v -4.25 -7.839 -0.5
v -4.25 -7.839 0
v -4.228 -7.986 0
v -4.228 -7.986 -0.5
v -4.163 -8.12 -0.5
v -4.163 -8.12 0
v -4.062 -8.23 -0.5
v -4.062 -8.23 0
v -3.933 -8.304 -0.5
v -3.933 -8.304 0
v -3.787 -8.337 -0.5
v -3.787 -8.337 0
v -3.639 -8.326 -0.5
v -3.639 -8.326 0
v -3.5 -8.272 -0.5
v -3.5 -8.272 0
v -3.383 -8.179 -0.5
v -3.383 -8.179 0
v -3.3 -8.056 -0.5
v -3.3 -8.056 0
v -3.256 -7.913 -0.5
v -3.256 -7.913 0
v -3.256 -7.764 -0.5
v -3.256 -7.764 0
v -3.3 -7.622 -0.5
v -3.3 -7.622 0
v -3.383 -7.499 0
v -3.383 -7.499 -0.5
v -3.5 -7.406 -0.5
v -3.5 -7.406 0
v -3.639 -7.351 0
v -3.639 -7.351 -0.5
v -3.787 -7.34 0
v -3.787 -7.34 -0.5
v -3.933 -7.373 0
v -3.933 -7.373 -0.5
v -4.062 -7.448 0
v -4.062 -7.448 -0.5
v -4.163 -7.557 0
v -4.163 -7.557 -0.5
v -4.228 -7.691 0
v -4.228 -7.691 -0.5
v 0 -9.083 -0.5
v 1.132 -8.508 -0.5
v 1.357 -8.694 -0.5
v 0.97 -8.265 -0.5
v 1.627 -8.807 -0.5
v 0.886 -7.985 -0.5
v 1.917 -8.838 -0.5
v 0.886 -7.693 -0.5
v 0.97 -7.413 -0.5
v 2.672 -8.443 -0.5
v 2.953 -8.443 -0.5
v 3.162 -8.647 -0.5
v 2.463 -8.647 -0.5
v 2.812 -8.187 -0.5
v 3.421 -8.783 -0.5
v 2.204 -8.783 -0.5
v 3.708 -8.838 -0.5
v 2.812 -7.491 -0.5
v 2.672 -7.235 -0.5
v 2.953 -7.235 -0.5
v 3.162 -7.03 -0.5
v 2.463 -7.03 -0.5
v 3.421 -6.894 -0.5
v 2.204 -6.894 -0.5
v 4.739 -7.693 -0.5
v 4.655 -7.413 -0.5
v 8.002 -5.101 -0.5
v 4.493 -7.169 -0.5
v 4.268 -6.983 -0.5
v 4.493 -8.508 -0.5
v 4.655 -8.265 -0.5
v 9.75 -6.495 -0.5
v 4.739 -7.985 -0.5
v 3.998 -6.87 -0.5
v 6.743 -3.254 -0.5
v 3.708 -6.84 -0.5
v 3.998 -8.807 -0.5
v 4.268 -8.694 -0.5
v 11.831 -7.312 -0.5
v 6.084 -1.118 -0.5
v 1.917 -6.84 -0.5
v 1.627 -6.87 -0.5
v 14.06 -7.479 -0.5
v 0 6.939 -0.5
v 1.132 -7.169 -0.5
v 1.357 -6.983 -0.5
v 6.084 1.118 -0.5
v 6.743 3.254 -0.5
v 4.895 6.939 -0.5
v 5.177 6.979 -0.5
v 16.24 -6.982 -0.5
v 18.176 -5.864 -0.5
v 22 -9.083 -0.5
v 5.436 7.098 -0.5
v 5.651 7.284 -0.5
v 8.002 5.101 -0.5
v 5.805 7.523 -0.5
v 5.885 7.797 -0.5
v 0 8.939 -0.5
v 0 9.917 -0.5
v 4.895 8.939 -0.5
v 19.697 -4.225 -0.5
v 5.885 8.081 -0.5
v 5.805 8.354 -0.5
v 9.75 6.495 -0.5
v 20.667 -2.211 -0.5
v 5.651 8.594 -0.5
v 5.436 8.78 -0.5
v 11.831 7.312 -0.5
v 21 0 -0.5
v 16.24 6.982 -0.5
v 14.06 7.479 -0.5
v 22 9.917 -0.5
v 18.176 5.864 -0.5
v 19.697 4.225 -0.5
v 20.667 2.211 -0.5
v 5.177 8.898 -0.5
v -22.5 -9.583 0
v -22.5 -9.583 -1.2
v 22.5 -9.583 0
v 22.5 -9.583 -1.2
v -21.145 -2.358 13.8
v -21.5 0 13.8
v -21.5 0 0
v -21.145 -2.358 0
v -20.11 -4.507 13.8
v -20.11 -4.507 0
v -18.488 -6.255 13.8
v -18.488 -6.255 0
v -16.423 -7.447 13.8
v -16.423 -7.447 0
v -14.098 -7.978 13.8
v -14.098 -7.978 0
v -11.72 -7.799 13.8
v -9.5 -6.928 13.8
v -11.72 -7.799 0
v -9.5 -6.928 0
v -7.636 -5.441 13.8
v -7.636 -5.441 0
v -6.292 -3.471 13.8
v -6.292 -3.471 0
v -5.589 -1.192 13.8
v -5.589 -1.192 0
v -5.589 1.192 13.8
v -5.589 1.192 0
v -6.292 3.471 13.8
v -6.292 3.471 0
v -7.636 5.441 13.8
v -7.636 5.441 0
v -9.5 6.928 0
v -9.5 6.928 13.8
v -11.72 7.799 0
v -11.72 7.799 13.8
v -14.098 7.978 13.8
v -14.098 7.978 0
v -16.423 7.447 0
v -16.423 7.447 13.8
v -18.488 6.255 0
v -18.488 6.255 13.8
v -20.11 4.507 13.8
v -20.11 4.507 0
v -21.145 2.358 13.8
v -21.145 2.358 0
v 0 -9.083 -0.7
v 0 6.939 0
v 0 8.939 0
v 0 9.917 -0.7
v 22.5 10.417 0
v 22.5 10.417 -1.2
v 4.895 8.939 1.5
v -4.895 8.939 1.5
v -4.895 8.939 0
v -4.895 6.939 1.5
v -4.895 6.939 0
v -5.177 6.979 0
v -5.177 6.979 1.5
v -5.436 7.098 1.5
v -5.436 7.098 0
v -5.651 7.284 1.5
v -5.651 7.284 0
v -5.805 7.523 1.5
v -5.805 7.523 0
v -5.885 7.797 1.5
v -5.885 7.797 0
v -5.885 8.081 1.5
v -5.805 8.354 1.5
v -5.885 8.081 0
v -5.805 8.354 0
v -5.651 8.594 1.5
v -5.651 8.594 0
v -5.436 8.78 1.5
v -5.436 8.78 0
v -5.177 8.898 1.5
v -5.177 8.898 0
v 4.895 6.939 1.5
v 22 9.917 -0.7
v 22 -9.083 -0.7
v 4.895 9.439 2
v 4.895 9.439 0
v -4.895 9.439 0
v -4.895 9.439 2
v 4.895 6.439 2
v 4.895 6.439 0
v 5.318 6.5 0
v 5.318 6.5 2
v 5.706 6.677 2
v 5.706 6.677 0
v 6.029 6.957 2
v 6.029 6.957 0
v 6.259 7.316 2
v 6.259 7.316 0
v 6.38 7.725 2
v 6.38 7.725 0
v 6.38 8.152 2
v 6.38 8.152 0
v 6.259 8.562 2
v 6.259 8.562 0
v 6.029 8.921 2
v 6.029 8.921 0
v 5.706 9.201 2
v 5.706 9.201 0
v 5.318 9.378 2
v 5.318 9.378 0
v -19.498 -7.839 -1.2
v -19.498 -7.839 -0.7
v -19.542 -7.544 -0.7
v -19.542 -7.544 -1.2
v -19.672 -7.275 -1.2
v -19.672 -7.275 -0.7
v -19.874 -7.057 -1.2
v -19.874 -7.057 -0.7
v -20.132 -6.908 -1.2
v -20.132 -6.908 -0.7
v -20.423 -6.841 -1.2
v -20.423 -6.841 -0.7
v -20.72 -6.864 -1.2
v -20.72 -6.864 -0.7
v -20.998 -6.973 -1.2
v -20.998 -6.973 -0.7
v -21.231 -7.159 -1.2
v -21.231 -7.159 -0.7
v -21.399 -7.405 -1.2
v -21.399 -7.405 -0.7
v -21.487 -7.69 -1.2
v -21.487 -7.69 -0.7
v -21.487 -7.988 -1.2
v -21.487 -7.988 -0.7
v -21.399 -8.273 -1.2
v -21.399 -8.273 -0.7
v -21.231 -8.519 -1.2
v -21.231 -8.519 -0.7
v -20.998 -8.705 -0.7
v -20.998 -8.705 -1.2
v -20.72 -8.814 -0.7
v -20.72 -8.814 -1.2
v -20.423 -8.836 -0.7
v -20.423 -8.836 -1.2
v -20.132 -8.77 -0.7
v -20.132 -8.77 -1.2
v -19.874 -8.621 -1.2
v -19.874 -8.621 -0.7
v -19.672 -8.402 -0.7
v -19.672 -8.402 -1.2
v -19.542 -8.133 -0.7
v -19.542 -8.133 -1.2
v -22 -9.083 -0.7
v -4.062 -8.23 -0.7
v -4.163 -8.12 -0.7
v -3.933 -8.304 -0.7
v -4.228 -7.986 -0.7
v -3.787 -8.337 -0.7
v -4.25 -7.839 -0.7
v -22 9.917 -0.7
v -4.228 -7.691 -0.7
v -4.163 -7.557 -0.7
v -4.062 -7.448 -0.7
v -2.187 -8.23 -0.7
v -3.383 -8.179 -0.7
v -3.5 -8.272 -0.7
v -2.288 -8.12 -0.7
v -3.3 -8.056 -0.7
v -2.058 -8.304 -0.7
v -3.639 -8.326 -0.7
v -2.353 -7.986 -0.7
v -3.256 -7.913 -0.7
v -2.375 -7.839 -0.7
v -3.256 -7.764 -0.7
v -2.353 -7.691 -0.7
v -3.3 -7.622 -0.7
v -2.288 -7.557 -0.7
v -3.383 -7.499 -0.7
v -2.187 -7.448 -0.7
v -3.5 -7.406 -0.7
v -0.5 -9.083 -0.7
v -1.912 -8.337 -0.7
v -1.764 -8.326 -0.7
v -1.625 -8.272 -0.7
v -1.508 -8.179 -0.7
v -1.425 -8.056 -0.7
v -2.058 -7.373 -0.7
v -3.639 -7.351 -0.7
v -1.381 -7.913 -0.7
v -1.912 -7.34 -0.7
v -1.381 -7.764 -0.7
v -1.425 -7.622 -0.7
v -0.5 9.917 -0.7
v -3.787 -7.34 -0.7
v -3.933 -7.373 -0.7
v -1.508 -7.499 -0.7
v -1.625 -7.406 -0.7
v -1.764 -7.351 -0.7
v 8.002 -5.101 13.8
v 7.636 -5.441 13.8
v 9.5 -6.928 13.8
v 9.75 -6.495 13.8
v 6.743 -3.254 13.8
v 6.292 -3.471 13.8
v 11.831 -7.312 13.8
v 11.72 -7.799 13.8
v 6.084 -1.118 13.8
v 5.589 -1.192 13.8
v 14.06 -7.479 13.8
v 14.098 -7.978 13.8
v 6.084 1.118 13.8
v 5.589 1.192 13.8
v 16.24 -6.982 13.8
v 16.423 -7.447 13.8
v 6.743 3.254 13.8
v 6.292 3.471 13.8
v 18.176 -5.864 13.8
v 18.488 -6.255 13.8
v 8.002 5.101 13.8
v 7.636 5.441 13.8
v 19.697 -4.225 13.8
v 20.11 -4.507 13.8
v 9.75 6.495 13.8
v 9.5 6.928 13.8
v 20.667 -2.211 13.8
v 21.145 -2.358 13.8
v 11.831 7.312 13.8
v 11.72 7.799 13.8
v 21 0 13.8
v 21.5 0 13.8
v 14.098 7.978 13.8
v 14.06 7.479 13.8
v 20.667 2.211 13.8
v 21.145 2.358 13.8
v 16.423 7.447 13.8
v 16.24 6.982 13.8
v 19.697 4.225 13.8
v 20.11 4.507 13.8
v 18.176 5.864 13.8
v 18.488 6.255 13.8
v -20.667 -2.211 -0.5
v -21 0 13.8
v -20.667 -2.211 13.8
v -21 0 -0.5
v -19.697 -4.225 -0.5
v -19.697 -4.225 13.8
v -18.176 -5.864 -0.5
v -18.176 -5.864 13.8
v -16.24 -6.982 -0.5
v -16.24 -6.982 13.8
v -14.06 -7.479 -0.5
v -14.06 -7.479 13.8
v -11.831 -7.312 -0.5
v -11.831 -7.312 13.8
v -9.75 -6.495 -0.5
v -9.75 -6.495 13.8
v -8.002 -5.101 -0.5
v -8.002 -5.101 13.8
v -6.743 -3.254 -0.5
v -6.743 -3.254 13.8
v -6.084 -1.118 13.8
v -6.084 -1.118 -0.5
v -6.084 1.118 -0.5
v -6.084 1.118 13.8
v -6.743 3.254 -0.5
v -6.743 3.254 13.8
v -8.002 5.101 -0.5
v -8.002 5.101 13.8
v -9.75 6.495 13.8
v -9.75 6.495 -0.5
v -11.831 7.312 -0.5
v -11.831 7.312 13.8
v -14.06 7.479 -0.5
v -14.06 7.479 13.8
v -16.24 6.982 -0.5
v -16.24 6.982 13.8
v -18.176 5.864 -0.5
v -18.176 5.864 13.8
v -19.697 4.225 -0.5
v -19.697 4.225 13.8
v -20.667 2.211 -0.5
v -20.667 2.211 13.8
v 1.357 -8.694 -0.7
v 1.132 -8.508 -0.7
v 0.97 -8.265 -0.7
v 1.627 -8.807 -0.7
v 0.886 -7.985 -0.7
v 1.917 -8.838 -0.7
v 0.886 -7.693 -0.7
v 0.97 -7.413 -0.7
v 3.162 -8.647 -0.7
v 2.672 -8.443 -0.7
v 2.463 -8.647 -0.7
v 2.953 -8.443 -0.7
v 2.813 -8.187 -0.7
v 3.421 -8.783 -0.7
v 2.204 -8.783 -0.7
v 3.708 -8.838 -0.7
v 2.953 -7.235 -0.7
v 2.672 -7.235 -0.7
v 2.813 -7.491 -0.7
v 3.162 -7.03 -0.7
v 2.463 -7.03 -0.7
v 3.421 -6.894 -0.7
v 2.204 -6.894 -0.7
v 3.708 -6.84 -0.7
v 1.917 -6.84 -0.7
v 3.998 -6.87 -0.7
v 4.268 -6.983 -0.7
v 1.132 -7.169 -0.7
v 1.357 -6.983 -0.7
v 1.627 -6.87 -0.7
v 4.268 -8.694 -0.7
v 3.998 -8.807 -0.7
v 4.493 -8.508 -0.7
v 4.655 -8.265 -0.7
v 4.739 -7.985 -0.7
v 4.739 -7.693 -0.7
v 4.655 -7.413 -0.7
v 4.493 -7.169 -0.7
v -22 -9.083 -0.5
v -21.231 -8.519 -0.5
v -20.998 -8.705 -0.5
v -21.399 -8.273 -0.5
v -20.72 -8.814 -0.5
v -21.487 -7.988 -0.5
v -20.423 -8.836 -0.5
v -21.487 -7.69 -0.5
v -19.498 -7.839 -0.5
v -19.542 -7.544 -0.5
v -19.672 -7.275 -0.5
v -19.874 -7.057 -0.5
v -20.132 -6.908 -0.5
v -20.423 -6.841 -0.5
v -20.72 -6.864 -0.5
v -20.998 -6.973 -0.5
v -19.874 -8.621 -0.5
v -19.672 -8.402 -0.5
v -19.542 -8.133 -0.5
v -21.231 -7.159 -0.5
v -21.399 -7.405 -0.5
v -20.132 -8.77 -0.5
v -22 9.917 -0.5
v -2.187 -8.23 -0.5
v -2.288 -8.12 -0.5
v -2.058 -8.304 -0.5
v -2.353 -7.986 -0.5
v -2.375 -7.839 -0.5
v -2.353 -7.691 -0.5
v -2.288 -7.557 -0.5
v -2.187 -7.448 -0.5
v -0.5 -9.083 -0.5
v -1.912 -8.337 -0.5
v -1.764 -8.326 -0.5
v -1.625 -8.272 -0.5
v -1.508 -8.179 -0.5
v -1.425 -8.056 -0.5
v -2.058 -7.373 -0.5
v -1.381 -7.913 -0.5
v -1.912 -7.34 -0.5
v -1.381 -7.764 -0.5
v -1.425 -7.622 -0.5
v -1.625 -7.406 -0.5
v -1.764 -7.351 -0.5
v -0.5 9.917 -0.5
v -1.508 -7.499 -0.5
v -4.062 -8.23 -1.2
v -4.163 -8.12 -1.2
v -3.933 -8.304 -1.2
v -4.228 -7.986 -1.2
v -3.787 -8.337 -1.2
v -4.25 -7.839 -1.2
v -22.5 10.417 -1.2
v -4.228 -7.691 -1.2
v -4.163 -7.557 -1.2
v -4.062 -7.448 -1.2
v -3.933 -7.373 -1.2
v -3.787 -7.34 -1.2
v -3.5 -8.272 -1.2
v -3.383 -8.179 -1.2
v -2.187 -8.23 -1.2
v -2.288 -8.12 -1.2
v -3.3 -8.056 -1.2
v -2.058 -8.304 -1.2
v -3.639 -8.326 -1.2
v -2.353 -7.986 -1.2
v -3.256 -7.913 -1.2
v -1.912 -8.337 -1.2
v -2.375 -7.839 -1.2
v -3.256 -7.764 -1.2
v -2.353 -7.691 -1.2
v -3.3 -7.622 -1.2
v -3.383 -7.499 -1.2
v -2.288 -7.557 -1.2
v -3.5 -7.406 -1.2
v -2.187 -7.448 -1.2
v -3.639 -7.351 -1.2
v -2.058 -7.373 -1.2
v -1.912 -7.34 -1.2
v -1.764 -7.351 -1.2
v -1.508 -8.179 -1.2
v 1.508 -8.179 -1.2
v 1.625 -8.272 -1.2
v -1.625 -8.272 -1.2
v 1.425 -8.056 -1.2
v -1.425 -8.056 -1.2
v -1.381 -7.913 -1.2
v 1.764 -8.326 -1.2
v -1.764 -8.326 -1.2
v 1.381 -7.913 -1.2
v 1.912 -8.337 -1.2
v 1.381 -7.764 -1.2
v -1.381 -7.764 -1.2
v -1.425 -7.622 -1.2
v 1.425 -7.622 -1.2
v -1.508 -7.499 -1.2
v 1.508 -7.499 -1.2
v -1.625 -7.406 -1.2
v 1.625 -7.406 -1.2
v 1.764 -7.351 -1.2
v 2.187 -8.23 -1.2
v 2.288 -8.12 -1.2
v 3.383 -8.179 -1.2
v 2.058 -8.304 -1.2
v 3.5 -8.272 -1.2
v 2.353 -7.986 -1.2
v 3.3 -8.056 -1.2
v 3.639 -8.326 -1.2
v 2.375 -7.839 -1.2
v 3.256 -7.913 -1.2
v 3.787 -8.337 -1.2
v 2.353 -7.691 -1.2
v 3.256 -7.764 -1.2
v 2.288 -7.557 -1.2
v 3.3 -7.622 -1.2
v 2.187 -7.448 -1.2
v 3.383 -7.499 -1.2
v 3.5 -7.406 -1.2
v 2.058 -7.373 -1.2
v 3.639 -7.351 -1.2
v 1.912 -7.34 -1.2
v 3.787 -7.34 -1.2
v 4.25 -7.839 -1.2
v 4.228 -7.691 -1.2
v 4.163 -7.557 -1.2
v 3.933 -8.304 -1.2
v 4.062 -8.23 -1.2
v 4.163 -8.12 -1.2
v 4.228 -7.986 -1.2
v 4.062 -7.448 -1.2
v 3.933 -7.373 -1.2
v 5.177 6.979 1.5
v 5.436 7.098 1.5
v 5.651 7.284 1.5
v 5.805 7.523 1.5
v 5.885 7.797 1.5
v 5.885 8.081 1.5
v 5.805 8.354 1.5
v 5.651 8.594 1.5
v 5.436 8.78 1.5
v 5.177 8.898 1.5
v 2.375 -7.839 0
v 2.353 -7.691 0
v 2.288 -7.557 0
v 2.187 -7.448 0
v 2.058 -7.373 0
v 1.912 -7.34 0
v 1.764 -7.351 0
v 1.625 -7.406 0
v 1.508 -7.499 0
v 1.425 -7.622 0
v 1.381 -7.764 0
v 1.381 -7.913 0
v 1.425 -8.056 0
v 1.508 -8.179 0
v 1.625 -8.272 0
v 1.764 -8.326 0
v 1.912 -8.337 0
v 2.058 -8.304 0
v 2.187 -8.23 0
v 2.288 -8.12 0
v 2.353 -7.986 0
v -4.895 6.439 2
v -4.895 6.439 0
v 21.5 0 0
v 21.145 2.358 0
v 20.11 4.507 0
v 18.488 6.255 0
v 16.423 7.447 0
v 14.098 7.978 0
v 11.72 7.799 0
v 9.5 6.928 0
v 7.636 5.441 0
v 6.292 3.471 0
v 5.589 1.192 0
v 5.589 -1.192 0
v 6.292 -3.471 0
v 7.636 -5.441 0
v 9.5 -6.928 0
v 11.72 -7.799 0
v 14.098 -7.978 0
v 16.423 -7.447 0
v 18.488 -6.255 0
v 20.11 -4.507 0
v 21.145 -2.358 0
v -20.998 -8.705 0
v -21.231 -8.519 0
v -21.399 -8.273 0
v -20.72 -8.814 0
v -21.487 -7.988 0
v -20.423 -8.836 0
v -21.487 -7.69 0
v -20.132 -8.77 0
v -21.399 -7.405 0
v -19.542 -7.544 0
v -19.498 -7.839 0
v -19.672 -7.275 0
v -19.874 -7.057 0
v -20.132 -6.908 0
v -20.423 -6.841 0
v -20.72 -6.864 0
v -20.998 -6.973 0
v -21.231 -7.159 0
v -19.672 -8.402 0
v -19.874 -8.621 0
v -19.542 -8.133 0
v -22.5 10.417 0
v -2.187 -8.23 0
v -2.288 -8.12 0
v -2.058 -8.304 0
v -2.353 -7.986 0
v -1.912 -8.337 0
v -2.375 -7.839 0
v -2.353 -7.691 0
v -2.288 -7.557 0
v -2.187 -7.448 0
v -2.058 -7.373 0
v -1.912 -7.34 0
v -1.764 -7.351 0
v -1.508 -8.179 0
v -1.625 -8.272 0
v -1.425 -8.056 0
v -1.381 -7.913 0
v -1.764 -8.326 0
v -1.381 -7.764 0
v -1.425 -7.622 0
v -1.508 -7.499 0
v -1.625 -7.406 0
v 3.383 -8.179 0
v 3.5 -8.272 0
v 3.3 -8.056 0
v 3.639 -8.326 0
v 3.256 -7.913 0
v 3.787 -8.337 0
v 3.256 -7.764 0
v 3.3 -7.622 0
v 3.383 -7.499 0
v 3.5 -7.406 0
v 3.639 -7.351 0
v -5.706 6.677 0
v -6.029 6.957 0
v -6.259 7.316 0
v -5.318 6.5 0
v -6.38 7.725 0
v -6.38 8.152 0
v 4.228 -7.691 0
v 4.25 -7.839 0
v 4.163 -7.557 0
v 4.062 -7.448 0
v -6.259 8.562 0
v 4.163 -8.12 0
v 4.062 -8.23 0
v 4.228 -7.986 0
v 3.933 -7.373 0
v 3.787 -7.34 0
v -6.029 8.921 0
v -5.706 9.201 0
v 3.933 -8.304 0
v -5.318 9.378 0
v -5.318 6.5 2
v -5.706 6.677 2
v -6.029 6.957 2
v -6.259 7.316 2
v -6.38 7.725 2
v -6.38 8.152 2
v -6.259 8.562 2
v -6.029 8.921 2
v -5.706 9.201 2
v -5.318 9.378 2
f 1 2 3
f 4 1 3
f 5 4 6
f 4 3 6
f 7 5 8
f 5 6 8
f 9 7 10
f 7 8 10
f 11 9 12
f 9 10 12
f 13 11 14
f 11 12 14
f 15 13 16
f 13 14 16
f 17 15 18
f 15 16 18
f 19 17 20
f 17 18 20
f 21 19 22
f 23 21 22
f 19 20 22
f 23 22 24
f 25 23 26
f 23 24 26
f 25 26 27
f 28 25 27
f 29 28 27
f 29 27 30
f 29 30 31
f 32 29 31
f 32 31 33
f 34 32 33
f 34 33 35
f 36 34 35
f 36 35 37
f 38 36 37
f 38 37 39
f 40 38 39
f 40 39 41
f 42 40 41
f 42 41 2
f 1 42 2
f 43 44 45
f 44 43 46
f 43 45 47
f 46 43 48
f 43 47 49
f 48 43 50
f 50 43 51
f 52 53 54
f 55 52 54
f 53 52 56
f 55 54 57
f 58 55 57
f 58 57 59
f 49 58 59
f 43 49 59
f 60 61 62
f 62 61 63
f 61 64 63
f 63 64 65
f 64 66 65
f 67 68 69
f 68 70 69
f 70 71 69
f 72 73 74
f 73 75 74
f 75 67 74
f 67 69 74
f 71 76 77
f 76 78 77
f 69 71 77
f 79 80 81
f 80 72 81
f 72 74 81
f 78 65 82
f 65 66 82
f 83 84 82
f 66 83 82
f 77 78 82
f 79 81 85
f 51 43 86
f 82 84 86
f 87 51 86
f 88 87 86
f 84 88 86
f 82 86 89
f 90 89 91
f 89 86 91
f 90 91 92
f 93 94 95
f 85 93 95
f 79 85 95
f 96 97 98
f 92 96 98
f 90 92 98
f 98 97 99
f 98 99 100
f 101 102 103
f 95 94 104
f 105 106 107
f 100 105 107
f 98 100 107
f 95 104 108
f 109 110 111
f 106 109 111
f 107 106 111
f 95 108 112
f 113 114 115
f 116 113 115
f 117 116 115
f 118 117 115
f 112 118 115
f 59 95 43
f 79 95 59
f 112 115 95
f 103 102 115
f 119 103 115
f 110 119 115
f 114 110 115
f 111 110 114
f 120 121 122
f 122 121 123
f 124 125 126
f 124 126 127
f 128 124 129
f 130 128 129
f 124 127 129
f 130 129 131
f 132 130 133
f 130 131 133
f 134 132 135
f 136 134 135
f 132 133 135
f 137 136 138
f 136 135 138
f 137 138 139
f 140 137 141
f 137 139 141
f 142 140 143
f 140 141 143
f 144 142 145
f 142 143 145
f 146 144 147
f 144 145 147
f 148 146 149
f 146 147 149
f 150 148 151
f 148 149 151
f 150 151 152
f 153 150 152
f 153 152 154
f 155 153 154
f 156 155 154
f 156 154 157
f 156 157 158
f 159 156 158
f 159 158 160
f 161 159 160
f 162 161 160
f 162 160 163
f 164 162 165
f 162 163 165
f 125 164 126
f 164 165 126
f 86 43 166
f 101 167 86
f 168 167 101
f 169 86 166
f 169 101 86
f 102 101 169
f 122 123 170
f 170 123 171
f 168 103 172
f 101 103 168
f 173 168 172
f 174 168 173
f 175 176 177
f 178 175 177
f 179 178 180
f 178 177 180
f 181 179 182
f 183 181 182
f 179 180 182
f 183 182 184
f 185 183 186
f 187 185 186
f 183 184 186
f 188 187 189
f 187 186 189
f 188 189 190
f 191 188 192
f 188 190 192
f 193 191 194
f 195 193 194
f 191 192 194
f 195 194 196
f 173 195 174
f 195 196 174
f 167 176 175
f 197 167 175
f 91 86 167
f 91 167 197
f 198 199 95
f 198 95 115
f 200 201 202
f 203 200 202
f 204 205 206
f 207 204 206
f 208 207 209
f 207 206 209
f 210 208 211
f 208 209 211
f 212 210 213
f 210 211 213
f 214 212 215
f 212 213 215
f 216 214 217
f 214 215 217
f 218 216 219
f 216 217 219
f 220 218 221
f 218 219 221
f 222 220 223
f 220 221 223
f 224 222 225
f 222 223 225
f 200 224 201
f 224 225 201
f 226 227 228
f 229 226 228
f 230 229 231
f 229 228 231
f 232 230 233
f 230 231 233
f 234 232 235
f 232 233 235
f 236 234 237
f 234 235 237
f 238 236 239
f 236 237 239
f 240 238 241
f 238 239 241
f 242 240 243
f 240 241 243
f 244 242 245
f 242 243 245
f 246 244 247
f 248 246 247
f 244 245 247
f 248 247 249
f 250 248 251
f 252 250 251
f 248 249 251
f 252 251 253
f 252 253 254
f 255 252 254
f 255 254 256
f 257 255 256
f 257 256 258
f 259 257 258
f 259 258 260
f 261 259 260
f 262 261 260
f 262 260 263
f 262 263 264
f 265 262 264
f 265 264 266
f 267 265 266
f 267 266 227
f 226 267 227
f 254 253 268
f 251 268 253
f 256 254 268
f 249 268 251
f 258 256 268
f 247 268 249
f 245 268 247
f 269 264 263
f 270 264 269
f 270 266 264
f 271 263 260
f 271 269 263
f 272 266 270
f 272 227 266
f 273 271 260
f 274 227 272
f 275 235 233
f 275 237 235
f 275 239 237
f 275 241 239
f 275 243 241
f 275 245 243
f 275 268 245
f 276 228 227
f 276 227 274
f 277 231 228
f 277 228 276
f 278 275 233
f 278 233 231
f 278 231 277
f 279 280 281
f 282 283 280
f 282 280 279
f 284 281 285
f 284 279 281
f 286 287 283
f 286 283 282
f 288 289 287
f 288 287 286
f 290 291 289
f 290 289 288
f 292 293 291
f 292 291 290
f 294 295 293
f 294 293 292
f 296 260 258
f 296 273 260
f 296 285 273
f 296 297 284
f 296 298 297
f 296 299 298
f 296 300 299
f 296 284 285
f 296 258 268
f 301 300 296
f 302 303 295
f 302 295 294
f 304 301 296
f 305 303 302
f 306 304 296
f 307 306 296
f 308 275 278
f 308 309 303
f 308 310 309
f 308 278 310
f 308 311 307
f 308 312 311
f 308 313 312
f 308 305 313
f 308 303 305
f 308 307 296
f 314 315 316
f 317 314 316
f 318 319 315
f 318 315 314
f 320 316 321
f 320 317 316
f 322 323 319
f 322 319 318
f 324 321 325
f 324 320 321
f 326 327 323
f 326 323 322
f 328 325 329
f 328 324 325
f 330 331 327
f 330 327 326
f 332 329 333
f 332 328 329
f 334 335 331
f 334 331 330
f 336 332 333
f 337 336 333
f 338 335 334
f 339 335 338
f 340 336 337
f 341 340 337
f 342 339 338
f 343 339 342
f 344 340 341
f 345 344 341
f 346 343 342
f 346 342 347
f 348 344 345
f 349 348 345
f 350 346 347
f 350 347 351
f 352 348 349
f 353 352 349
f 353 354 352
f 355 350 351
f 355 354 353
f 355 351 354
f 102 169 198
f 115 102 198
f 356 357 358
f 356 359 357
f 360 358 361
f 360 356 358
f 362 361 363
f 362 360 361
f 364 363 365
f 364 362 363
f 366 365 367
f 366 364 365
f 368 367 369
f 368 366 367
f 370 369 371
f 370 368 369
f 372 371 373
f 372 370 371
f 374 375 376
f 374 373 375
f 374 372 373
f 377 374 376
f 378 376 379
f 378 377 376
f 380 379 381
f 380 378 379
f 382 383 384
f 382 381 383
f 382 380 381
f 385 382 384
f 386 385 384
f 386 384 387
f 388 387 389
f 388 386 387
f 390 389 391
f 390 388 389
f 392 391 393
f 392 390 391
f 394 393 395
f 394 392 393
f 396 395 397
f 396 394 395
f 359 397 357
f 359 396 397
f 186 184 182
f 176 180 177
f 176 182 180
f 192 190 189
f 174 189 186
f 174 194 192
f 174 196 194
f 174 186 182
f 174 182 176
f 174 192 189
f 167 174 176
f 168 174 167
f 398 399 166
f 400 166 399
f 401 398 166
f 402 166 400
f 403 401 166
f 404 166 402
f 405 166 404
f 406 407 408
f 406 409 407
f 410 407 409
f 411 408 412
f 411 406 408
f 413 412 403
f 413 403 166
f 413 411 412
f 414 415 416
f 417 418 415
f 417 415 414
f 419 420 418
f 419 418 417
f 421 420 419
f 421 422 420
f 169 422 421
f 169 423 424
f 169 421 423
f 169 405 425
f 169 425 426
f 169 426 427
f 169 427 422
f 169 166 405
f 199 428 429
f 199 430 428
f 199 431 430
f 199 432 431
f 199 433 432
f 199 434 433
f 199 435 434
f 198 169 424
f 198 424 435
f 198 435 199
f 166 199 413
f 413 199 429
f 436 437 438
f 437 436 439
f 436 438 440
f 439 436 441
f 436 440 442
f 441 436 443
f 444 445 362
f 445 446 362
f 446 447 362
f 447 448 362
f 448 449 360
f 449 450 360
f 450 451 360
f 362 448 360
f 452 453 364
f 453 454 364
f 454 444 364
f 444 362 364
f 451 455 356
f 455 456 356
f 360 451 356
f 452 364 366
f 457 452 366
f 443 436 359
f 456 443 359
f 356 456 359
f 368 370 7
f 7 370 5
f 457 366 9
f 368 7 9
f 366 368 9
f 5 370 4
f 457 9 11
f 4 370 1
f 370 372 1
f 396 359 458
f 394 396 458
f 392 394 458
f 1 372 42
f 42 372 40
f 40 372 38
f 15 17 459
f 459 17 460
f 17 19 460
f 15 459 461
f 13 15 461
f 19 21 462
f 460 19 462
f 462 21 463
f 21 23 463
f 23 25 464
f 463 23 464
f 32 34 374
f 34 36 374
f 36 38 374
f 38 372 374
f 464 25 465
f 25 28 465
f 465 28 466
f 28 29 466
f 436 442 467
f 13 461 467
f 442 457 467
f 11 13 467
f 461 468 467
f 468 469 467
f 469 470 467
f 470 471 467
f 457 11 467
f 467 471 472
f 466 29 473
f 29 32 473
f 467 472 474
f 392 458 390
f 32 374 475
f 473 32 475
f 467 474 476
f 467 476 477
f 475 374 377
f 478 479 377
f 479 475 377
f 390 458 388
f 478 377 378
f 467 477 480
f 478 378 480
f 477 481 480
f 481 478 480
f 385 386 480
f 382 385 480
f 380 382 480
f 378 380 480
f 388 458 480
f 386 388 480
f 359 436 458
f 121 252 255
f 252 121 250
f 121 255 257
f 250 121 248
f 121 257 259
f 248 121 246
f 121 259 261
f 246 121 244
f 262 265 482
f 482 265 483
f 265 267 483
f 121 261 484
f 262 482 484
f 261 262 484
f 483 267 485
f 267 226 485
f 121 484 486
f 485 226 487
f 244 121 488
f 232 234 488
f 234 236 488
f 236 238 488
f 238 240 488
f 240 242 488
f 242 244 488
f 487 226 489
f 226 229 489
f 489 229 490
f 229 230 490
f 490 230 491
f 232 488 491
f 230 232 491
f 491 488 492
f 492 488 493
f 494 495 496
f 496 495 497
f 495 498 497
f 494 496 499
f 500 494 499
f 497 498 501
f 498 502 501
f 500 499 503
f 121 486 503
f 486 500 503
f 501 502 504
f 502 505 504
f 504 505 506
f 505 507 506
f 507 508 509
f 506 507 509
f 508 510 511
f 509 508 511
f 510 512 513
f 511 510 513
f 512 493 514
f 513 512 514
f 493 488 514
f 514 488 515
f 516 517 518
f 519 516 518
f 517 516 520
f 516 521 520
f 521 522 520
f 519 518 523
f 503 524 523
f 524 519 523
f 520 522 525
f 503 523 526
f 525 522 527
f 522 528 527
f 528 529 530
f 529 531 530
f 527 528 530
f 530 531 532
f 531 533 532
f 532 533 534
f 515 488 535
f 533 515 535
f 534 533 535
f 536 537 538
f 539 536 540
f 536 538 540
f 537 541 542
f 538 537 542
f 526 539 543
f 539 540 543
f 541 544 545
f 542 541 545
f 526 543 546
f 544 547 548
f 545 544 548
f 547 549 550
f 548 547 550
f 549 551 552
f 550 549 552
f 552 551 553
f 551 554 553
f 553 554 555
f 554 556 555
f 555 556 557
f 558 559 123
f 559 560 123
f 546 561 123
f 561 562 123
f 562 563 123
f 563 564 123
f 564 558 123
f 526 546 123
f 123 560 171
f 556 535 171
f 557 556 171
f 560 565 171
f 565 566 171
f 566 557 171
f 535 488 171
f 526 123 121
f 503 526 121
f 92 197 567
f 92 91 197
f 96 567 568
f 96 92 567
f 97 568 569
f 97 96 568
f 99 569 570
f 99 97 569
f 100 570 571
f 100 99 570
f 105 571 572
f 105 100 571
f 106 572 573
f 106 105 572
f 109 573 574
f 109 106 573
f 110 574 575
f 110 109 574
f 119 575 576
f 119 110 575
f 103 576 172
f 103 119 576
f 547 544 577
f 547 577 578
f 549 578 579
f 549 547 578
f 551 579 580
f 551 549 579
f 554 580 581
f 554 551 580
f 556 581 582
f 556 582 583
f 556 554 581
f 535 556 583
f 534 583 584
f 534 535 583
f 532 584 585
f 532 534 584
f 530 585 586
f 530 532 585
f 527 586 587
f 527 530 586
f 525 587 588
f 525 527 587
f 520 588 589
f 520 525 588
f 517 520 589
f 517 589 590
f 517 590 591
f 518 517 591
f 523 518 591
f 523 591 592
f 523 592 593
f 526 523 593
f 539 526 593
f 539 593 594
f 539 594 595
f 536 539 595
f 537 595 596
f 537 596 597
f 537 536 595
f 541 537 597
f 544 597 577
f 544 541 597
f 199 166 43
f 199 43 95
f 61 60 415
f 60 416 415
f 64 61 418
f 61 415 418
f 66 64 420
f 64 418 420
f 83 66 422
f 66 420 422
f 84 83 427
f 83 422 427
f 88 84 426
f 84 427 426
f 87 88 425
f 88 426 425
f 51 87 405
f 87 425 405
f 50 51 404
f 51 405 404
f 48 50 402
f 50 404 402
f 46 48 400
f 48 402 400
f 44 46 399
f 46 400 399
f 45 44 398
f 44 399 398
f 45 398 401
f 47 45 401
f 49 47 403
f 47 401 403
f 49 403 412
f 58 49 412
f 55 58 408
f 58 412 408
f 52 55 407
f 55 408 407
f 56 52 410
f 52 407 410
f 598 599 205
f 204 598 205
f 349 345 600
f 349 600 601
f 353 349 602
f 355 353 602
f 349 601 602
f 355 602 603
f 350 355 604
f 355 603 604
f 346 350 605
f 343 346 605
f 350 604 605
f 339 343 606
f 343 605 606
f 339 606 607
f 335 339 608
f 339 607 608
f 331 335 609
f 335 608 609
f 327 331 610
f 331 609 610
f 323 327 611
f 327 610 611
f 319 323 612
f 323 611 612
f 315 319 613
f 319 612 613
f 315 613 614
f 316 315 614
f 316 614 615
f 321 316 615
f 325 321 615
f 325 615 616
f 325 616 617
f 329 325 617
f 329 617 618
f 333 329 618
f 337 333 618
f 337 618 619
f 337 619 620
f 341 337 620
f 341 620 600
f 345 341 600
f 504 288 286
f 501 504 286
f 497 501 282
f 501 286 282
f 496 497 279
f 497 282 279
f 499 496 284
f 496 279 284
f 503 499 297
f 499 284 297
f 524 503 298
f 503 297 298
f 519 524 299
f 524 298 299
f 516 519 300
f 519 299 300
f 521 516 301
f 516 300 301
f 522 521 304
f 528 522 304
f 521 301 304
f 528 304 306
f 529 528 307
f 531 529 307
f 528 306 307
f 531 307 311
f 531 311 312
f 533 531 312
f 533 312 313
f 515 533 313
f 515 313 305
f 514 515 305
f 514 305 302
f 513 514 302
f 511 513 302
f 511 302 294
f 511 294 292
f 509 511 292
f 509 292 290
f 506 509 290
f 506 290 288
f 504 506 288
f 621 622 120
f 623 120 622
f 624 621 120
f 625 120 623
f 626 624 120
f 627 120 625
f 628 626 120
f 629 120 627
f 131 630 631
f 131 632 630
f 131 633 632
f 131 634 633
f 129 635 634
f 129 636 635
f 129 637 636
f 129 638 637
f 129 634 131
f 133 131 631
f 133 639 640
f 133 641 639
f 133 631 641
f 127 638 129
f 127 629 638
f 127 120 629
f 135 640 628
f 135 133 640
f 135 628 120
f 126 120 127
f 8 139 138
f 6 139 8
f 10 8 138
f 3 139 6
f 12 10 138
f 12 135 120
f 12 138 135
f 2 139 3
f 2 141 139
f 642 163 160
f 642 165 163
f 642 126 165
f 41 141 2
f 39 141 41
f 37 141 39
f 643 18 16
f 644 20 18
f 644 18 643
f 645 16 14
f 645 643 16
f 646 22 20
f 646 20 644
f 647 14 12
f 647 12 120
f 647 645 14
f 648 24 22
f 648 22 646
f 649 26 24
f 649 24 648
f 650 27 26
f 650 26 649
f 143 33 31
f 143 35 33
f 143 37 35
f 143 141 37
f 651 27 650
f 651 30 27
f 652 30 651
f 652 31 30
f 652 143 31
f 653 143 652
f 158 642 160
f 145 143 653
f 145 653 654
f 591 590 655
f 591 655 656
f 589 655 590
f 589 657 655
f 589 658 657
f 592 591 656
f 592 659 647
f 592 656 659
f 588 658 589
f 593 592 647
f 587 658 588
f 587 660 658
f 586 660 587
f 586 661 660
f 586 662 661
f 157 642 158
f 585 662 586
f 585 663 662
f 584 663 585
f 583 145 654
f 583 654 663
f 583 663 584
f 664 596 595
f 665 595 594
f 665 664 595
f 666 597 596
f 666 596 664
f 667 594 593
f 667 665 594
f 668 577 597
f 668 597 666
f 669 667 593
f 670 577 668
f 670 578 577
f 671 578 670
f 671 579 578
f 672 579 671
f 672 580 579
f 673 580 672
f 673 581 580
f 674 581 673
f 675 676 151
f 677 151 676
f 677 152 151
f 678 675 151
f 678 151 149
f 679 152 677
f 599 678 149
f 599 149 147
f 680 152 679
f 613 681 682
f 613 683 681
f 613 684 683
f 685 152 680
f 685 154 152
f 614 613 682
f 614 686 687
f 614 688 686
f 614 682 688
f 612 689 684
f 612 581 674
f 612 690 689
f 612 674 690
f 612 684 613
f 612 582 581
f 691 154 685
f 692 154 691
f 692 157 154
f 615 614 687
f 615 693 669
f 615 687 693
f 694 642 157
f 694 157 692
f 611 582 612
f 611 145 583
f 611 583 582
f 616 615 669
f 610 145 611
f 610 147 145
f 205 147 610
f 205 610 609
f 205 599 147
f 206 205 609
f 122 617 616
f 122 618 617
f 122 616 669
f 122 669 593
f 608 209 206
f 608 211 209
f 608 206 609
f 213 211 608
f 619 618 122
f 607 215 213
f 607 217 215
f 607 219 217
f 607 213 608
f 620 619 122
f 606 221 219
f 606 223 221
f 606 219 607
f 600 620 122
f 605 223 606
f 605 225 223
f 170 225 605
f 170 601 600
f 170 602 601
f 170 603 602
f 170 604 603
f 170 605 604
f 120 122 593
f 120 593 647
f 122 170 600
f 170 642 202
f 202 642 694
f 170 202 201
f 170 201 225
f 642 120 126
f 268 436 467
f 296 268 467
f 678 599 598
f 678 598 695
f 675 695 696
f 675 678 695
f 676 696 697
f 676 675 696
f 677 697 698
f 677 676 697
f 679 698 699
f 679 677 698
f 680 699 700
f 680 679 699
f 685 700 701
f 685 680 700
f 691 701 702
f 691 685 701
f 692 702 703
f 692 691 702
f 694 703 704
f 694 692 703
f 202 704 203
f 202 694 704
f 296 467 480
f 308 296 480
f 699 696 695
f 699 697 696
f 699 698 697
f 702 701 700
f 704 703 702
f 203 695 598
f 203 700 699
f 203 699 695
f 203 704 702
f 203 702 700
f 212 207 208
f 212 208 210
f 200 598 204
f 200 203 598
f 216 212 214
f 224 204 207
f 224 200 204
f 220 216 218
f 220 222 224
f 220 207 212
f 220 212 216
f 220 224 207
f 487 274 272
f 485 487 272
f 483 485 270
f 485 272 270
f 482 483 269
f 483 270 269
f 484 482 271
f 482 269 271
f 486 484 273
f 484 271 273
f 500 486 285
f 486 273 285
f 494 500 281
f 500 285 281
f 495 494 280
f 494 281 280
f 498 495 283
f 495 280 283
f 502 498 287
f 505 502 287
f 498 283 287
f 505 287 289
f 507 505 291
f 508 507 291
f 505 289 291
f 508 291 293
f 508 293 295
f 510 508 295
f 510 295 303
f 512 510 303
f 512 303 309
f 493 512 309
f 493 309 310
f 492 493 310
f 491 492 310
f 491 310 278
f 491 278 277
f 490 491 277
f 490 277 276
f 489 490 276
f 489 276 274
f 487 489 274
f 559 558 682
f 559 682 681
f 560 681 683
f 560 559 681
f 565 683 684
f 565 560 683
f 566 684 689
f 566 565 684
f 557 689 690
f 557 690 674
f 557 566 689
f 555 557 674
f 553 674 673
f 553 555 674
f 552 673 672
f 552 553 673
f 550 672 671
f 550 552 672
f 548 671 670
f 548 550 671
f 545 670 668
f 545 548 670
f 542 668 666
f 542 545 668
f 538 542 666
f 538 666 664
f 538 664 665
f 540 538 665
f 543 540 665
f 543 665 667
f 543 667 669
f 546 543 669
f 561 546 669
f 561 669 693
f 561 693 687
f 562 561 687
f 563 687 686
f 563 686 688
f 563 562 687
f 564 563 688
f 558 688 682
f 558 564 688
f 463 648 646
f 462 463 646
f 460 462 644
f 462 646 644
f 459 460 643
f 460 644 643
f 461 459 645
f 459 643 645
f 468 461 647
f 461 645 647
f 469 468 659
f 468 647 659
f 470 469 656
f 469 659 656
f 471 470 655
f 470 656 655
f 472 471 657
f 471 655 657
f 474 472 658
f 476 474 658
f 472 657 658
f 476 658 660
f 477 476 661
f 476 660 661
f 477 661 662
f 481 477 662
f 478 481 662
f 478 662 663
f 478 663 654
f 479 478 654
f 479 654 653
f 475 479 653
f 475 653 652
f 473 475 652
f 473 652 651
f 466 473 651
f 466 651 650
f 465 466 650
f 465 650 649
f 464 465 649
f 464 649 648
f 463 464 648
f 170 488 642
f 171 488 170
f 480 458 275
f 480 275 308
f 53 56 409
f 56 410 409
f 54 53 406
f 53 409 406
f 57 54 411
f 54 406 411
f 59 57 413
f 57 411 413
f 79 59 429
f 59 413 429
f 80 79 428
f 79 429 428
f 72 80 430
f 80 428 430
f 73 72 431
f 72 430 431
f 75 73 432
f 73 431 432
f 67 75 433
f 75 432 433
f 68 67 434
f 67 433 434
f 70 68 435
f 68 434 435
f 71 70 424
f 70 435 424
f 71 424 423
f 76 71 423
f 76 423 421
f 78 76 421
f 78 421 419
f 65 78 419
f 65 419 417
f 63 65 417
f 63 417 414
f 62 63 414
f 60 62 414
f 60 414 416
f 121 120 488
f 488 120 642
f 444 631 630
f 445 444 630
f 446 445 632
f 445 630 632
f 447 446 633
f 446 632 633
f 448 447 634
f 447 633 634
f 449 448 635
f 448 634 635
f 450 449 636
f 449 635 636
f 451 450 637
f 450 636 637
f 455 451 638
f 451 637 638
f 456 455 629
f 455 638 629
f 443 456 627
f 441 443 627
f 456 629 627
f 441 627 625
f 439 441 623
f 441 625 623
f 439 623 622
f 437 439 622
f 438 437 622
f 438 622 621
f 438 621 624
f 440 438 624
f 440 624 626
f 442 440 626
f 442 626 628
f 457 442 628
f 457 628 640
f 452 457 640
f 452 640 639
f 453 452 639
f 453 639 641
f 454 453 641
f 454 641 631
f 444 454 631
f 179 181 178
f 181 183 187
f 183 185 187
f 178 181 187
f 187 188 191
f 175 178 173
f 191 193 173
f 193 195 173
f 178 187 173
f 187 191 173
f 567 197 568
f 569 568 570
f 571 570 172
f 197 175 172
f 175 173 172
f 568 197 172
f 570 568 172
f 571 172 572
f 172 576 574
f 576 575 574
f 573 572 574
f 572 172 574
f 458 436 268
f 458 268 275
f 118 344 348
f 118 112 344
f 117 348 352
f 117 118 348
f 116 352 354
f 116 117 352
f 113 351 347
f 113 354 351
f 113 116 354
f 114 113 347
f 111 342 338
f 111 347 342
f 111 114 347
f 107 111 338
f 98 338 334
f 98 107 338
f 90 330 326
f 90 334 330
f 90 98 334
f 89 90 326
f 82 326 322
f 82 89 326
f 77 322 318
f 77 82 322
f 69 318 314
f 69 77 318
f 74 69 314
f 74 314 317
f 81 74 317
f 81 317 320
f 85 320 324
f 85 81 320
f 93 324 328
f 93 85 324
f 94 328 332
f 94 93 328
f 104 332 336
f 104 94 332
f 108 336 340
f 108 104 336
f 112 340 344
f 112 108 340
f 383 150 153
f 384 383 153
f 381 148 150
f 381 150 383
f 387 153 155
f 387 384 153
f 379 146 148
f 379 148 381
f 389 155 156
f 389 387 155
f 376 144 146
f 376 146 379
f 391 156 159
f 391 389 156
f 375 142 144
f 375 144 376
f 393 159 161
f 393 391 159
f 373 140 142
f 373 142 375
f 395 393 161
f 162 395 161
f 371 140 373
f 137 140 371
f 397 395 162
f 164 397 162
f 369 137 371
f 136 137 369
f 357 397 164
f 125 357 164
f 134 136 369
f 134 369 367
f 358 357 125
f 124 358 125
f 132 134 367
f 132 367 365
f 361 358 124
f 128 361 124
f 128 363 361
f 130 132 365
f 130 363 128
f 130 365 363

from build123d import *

# Parameters (mm, degrees)
ESQUISSE1_W             = 22.5
ESQUISSE1_H             = 20
BOSS_EXTRU_1_DEPTH      = 1.2
ESQUISSE2_R             = 8
BOSS_EXTRU_2_DEPTH      = 13.8
COQUE2_T                = -0.5
ESQUISSE3_R             = 1
ENL_V_MAT_EXTRU_1_DEPTH = 29.375992396
ESQUISSE4_R             = 0.5
ENL_V_MAT_EXTRU_2_DEPTH = 2.8
BOSS_EXTRU_3_DEPTH      = 2
SYM_TRIE1_START         = -1.2
SYM_TRIE1_OUTLINE_R     = 8
SYM_TRIE1_DEPTH         = 15
SYM_TRIE1_2_OUTLINE_W   = 22.5
SYM_TRIE1_2_OUTLINE_H   = 20
SYM_TRIE1_2_OUTLINE_R   = 0.5
SYM_TRIE1_2_OUTLINE_R_2 = 8
SYM_TRIE1_2_DEPTH       = 1.2
SYM_TRIE1_3_DEPTH       = 2
COQUE4_T                = -0.5


# Read off the part's stored shape, not the designer's step: Symétrie1
with BuildPart() as part:
    # Esquisse1 → Boss.-Extru.1 (new body)
    with BuildSketch(Plane.XY):
        with Locations((-11.25, 0.416666667)):
            Rectangle(ESQUISSE1_W, ESQUISSE1_H)
    extrude(amount=-BOSS_EXTRU_1_DEPTH)

    # Esquisse2 → Boss.-Extru.2 (add)
    with BuildSketch(Plane.XY):
        with Locations(Location((-13.5, 0, 0), (0, 0, 180))):
            Circle(ESQUISSE2_R)
    extrude(amount=BOSS_EXTRU_2_DEPTH)

    # Coque2
    coque2_openings = [part.faces().sort_by_distance(p)[0] for p in [
        (-13.5, 0, 13.8),
    ]]
    offset(amount=COQUE2_T, openings=coque2_openings, kind=Kind.INTERSECTION)

    # Esquisse3 → Enlèv. mat.-Extru.1 (cut, through all)
    with BuildSketch(Plane.XY):
        with Locations((-20.497748718, -7.838681671)):
            Circle(ESQUISSE3_R)
    extrude(amount=-ENL_V_MAT_EXTRU_1_DEPTH, mode=Mode.SUBTRACT)

    # Esquisse4 → Enlèv. mat.-Extru.2 (cut)
    with BuildSketch(Plane.XY):
        with Locations(Location((-3.75, -7.838681671, 0), (0, 0, 180))):
            Circle(ESQUISSE4_R)
        with Locations(Location((-1.875, -7.838681671, 0), (0, 0, 180))):
            Circle(ESQUISSE4_R)
    extrude(amount=-ENL_V_MAT_EXTRU_2_DEPTH, mode=Mode.SUBTRACT)

    # Esquisse5 → Boss.-Extru.3 (add)
    with BuildSketch(Plane.XY):
        with BuildLine():
            Line((0, 6.438889699), (-4.894980877, 6.438889699))
            ThreePointArc((-4.894980877, 6.438889699), (-6.394980877, 7.938889699), (-4.894980877, 9.438889699))
            Line((-4.894980877, 9.438889699), (0, 9.438889699))
            Line((0, 9.438889699), (0, 6.438889699))
        make_face()
    extrude(amount=BOSS_EXTRU_3_DEPTH)



with BuildPart() as body_2:
    # Symétrie1 outline → Symétrie1 (new body)
    with BuildSketch(Plane.XY.offset(SYM_TRIE1_START)):
        with Locations((13.5, 0)):
            Circle(SYM_TRIE1_OUTLINE_R)
    extrude(amount=SYM_TRIE1_DEPTH)


with BuildPart() as part_1:
    add(part.part)

    add(body_2.part)  # Sym_trie1 2 merges body 2
    # Sym_trie1 2 outline → Sym_trie1 2 (add)
    with BuildSketch(Plane.XY.offset(SYM_TRIE1_START)):
        with Locations((11.25, 0.416666667)):
            Rectangle(SYM_TRIE1_2_OUTLINE_W, SYM_TRIE1_2_OUTLINE_H)
        with Locations((1.875, -7.838681671)):
            Circle(SYM_TRIE1_2_OUTLINE_R, mode=Mode.SUBTRACT)
        with Locations((3.75, -7.838681671)):
            Circle(SYM_TRIE1_2_OUTLINE_R, mode=Mode.SUBTRACT)
        with Locations((13.5, 0)):
            Circle(SYM_TRIE1_2_OUTLINE_R_2, mode=Mode.SUBTRACT)
    extrude(amount=SYM_TRIE1_2_DEPTH)

    # Sym_trie1 3 outline → Sym_trie1 3 (add)
    with BuildSketch(Plane.XY):
        with BuildLine():
            Line((0, 9.438889699), (0, 6.438889699))
            Line((0, 6.438889699), (4.894980877, 6.438889699))
            ThreePointArc((4.894980877, 6.438889699), (6.394980877, 7.938889699), (4.894980877, 9.438889699))
            Line((4.894980877, 9.438889699), (0, 9.438889699))
        make_face()
    extrude(amount=SYM_TRIE1_3_DEPTH)

    # Coque4
    coque4_openings = [part_1.faces().sort_by_distance(p)[0] for p in [
        (13.5, 0, 13.8),
    ]]
    offset(amount=COQUE4_T, openings=coque4_openings, kind=Kind.INTERSECTION)


solid = part_1.part
